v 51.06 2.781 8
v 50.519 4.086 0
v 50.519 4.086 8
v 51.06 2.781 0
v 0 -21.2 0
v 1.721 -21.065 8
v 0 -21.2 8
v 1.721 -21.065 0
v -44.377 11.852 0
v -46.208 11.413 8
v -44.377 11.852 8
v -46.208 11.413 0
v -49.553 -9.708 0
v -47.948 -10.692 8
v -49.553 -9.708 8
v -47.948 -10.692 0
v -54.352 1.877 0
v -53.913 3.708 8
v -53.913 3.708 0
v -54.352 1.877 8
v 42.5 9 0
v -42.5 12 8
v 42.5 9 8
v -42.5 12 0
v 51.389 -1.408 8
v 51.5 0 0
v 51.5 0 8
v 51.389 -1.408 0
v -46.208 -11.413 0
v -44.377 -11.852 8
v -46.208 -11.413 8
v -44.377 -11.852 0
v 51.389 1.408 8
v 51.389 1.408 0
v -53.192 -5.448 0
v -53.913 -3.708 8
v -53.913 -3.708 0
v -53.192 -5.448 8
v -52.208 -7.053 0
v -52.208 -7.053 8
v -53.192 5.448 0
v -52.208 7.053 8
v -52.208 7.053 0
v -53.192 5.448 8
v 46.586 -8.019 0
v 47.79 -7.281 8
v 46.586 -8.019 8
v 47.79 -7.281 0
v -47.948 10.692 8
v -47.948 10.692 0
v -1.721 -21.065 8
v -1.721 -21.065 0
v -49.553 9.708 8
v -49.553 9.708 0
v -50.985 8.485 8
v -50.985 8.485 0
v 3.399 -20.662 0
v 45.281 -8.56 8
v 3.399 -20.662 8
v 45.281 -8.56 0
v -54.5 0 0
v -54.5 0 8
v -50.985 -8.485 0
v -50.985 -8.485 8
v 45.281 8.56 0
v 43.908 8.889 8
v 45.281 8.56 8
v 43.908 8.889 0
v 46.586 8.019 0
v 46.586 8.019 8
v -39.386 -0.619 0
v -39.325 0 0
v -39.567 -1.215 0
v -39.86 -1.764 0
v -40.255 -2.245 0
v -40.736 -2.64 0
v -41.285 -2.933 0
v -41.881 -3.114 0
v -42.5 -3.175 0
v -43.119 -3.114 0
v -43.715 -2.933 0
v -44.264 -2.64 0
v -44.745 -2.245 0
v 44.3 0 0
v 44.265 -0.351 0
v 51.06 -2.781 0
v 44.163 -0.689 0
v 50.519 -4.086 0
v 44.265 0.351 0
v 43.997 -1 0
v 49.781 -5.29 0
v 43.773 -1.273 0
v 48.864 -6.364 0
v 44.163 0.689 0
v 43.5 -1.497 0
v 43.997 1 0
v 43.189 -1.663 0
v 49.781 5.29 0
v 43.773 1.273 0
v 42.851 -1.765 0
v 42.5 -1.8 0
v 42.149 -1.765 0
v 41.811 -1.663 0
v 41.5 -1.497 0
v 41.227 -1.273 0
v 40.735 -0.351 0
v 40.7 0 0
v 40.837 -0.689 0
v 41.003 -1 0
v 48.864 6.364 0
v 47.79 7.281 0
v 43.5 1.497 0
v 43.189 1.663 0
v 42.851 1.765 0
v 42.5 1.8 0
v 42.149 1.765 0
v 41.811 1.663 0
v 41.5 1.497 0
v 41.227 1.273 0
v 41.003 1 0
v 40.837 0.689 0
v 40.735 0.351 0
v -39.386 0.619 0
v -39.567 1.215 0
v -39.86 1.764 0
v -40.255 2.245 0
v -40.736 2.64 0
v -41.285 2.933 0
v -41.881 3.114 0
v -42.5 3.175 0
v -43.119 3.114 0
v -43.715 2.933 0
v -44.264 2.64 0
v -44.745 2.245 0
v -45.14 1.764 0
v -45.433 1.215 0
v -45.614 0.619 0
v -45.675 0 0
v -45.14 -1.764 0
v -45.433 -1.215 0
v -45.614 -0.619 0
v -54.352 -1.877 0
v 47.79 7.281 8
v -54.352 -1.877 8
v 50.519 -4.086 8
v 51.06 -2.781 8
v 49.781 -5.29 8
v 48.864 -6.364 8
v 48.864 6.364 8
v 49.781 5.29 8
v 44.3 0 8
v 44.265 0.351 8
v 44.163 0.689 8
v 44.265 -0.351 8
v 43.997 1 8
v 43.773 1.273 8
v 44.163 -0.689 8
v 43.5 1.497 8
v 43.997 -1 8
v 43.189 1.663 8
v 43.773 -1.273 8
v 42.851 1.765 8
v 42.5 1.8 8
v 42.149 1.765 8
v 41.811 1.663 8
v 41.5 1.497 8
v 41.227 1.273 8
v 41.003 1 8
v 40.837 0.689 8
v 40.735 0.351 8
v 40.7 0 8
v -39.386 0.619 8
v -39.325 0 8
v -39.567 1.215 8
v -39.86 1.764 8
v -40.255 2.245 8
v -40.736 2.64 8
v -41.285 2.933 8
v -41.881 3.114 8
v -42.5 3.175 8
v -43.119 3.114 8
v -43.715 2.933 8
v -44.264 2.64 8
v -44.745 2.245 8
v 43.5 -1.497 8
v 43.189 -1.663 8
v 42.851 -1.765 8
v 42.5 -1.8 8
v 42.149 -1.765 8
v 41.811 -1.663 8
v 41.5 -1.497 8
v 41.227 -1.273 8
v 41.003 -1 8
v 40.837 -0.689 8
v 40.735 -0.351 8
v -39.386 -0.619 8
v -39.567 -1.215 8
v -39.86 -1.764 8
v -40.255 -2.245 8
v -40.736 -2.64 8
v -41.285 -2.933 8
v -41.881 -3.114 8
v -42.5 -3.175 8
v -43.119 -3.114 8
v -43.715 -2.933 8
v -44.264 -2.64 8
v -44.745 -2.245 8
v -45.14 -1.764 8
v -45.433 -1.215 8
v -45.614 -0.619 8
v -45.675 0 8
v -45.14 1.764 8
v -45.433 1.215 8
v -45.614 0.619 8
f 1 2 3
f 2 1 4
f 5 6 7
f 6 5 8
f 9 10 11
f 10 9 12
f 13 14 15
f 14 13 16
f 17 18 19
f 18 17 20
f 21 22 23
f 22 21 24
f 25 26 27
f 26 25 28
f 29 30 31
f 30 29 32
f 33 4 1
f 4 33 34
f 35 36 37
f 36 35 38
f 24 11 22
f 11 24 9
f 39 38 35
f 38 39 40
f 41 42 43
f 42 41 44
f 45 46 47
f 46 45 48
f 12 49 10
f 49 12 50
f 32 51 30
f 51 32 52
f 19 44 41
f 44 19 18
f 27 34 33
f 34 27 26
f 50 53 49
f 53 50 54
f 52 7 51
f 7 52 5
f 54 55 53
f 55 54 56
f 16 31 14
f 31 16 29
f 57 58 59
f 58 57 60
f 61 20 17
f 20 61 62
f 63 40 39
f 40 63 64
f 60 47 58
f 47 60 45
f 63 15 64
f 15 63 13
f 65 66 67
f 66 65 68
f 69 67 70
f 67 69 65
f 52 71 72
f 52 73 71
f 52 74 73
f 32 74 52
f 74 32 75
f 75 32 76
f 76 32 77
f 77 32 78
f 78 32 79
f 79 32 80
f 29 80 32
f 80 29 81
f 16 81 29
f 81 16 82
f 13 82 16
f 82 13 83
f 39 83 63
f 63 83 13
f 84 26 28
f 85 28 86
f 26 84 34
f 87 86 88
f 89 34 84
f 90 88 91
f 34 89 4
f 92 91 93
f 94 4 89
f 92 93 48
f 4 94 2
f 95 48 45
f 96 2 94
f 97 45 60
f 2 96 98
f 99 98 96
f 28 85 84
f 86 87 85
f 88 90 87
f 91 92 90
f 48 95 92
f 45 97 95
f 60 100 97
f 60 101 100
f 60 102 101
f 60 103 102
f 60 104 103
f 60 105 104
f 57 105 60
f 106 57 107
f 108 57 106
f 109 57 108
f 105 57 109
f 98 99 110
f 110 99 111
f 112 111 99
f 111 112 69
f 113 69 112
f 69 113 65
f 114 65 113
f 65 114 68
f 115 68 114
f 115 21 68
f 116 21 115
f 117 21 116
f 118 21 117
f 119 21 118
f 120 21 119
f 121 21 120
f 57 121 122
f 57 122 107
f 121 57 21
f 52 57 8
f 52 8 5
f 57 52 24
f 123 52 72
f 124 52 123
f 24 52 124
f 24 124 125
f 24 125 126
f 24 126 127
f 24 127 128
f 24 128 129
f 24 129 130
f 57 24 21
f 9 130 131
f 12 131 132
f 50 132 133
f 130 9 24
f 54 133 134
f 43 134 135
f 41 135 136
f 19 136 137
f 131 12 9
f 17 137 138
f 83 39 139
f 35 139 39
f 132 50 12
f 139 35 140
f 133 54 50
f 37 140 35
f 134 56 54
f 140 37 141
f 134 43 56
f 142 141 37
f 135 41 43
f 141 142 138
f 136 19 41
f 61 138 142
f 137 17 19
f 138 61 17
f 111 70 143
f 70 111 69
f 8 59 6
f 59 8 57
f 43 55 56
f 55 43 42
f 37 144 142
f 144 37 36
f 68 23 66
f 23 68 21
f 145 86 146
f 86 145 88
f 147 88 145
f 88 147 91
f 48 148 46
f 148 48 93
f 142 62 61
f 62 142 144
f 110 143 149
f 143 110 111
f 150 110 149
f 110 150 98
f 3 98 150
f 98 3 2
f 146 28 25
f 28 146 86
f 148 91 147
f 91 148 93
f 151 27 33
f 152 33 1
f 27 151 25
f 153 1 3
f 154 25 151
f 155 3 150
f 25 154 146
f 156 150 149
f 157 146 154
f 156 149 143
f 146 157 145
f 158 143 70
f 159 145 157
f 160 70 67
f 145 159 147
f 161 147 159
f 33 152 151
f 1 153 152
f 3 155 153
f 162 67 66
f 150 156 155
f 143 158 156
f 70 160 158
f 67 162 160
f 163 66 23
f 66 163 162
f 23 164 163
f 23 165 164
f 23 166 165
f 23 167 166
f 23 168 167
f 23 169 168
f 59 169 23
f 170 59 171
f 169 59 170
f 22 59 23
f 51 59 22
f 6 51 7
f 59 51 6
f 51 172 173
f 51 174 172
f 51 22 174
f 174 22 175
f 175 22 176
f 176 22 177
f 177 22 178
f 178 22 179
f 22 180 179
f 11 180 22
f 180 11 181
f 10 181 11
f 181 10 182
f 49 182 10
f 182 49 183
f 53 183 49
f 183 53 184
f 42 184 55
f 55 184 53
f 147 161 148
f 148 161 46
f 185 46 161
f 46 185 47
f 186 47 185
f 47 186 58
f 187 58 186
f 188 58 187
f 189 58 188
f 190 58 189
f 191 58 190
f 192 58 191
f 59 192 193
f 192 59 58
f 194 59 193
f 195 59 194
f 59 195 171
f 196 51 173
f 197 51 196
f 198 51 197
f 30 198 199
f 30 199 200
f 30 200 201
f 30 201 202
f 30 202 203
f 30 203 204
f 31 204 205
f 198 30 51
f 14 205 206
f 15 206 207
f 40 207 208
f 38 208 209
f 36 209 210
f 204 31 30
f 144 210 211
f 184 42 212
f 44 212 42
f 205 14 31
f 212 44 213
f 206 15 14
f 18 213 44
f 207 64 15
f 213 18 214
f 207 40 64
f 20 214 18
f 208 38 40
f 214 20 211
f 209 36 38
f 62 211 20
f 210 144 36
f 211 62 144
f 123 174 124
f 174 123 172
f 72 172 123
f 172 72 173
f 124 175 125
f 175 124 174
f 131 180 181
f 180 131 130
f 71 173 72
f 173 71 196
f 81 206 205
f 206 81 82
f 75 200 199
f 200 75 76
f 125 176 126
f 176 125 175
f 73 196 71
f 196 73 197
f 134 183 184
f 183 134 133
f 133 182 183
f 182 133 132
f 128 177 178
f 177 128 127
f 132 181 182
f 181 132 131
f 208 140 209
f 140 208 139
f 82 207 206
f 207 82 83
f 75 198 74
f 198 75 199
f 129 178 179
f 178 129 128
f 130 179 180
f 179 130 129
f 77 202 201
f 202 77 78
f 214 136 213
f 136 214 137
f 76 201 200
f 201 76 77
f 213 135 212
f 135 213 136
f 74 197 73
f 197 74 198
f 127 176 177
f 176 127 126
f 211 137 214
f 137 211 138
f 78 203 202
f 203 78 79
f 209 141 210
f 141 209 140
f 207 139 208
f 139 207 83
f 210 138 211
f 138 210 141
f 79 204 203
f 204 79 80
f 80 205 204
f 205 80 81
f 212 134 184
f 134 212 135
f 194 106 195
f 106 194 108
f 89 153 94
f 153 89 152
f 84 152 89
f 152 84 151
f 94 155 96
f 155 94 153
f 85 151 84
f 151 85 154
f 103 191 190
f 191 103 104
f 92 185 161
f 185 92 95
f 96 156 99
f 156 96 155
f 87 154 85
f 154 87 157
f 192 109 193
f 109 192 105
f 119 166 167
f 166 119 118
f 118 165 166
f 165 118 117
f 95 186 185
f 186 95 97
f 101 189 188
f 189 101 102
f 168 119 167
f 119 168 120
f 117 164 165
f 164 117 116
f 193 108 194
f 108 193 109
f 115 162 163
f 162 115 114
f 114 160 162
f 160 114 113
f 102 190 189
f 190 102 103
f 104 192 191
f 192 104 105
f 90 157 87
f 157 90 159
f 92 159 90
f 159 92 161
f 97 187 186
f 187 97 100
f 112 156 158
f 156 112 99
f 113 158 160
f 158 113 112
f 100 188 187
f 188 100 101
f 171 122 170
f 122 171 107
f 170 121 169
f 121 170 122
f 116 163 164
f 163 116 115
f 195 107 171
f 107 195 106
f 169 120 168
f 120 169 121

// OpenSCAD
$fn = 32;

// ----------------------------------------------------------------------
// Lever: 85 mm between the bosses, 8 mm thick, smooth outline
// ----------------------------------------------------------------------

// --- parameters (mm) ---
lever_l = 85;             // distance between the boss centres
boss_a = 24;              // first boss diameter
boss_b = 18;              // second boss diameter
bore_a = 6.35;            // first bore
bore_b = 3.6;             // second bore
lever_t = 8;              // lever thickness
boss_c = 22;              // middle boss diameter
bend = 10.2;              // how far the middle boss drops

lever_profile = [[-54.5, 0], [-54.352, -1.877], [-53.913, -3.708], [-53.192, -5.448], [-52.208, -7.053], [-50.985, -8.485], [-49.553, -9.708], [-47.948, -10.692], [-46.208, -11.413], [-44.377, -11.852], [-1.721, -21.065], [0, -21.2], [1.721, -21.065], [3.399, -20.662], [45.281, -8.56], [46.586, -8.019], [47.79, -7.281], [48.864, -6.364], [49.781, -5.29], [50.519, -4.086], [51.06, -2.781], [51.389, -1.408], [51.5, 0], [51.389, 1.408], [51.06, 2.781], [50.519, 4.086], [49.781, 5.29], [48.864, 6.364], [47.79, 7.281], [46.586, 8.019], [45.281, 8.56], [43.908, 8.889], [42.5, 9], [-42.5, 12], [-44.377, 11.852], [-46.208, 11.413], [-47.948, 10.692], [-49.553, 9.708], [-50.985, 8.485], [-52.208, 7.053], [-53.192, 5.448], [-53.913, 3.708], [-54.352, 1.877]];

difference() {
  linear_extrude(height = lever_t) polygon(lever_profile);
  translate([-42.5, 0, -2.5]) cylinder(h = lever_t + 5, d = bore_a);
  translate([42.5, 0, -2.5]) cylinder(h = lever_t + 5, d = bore_b);
}
